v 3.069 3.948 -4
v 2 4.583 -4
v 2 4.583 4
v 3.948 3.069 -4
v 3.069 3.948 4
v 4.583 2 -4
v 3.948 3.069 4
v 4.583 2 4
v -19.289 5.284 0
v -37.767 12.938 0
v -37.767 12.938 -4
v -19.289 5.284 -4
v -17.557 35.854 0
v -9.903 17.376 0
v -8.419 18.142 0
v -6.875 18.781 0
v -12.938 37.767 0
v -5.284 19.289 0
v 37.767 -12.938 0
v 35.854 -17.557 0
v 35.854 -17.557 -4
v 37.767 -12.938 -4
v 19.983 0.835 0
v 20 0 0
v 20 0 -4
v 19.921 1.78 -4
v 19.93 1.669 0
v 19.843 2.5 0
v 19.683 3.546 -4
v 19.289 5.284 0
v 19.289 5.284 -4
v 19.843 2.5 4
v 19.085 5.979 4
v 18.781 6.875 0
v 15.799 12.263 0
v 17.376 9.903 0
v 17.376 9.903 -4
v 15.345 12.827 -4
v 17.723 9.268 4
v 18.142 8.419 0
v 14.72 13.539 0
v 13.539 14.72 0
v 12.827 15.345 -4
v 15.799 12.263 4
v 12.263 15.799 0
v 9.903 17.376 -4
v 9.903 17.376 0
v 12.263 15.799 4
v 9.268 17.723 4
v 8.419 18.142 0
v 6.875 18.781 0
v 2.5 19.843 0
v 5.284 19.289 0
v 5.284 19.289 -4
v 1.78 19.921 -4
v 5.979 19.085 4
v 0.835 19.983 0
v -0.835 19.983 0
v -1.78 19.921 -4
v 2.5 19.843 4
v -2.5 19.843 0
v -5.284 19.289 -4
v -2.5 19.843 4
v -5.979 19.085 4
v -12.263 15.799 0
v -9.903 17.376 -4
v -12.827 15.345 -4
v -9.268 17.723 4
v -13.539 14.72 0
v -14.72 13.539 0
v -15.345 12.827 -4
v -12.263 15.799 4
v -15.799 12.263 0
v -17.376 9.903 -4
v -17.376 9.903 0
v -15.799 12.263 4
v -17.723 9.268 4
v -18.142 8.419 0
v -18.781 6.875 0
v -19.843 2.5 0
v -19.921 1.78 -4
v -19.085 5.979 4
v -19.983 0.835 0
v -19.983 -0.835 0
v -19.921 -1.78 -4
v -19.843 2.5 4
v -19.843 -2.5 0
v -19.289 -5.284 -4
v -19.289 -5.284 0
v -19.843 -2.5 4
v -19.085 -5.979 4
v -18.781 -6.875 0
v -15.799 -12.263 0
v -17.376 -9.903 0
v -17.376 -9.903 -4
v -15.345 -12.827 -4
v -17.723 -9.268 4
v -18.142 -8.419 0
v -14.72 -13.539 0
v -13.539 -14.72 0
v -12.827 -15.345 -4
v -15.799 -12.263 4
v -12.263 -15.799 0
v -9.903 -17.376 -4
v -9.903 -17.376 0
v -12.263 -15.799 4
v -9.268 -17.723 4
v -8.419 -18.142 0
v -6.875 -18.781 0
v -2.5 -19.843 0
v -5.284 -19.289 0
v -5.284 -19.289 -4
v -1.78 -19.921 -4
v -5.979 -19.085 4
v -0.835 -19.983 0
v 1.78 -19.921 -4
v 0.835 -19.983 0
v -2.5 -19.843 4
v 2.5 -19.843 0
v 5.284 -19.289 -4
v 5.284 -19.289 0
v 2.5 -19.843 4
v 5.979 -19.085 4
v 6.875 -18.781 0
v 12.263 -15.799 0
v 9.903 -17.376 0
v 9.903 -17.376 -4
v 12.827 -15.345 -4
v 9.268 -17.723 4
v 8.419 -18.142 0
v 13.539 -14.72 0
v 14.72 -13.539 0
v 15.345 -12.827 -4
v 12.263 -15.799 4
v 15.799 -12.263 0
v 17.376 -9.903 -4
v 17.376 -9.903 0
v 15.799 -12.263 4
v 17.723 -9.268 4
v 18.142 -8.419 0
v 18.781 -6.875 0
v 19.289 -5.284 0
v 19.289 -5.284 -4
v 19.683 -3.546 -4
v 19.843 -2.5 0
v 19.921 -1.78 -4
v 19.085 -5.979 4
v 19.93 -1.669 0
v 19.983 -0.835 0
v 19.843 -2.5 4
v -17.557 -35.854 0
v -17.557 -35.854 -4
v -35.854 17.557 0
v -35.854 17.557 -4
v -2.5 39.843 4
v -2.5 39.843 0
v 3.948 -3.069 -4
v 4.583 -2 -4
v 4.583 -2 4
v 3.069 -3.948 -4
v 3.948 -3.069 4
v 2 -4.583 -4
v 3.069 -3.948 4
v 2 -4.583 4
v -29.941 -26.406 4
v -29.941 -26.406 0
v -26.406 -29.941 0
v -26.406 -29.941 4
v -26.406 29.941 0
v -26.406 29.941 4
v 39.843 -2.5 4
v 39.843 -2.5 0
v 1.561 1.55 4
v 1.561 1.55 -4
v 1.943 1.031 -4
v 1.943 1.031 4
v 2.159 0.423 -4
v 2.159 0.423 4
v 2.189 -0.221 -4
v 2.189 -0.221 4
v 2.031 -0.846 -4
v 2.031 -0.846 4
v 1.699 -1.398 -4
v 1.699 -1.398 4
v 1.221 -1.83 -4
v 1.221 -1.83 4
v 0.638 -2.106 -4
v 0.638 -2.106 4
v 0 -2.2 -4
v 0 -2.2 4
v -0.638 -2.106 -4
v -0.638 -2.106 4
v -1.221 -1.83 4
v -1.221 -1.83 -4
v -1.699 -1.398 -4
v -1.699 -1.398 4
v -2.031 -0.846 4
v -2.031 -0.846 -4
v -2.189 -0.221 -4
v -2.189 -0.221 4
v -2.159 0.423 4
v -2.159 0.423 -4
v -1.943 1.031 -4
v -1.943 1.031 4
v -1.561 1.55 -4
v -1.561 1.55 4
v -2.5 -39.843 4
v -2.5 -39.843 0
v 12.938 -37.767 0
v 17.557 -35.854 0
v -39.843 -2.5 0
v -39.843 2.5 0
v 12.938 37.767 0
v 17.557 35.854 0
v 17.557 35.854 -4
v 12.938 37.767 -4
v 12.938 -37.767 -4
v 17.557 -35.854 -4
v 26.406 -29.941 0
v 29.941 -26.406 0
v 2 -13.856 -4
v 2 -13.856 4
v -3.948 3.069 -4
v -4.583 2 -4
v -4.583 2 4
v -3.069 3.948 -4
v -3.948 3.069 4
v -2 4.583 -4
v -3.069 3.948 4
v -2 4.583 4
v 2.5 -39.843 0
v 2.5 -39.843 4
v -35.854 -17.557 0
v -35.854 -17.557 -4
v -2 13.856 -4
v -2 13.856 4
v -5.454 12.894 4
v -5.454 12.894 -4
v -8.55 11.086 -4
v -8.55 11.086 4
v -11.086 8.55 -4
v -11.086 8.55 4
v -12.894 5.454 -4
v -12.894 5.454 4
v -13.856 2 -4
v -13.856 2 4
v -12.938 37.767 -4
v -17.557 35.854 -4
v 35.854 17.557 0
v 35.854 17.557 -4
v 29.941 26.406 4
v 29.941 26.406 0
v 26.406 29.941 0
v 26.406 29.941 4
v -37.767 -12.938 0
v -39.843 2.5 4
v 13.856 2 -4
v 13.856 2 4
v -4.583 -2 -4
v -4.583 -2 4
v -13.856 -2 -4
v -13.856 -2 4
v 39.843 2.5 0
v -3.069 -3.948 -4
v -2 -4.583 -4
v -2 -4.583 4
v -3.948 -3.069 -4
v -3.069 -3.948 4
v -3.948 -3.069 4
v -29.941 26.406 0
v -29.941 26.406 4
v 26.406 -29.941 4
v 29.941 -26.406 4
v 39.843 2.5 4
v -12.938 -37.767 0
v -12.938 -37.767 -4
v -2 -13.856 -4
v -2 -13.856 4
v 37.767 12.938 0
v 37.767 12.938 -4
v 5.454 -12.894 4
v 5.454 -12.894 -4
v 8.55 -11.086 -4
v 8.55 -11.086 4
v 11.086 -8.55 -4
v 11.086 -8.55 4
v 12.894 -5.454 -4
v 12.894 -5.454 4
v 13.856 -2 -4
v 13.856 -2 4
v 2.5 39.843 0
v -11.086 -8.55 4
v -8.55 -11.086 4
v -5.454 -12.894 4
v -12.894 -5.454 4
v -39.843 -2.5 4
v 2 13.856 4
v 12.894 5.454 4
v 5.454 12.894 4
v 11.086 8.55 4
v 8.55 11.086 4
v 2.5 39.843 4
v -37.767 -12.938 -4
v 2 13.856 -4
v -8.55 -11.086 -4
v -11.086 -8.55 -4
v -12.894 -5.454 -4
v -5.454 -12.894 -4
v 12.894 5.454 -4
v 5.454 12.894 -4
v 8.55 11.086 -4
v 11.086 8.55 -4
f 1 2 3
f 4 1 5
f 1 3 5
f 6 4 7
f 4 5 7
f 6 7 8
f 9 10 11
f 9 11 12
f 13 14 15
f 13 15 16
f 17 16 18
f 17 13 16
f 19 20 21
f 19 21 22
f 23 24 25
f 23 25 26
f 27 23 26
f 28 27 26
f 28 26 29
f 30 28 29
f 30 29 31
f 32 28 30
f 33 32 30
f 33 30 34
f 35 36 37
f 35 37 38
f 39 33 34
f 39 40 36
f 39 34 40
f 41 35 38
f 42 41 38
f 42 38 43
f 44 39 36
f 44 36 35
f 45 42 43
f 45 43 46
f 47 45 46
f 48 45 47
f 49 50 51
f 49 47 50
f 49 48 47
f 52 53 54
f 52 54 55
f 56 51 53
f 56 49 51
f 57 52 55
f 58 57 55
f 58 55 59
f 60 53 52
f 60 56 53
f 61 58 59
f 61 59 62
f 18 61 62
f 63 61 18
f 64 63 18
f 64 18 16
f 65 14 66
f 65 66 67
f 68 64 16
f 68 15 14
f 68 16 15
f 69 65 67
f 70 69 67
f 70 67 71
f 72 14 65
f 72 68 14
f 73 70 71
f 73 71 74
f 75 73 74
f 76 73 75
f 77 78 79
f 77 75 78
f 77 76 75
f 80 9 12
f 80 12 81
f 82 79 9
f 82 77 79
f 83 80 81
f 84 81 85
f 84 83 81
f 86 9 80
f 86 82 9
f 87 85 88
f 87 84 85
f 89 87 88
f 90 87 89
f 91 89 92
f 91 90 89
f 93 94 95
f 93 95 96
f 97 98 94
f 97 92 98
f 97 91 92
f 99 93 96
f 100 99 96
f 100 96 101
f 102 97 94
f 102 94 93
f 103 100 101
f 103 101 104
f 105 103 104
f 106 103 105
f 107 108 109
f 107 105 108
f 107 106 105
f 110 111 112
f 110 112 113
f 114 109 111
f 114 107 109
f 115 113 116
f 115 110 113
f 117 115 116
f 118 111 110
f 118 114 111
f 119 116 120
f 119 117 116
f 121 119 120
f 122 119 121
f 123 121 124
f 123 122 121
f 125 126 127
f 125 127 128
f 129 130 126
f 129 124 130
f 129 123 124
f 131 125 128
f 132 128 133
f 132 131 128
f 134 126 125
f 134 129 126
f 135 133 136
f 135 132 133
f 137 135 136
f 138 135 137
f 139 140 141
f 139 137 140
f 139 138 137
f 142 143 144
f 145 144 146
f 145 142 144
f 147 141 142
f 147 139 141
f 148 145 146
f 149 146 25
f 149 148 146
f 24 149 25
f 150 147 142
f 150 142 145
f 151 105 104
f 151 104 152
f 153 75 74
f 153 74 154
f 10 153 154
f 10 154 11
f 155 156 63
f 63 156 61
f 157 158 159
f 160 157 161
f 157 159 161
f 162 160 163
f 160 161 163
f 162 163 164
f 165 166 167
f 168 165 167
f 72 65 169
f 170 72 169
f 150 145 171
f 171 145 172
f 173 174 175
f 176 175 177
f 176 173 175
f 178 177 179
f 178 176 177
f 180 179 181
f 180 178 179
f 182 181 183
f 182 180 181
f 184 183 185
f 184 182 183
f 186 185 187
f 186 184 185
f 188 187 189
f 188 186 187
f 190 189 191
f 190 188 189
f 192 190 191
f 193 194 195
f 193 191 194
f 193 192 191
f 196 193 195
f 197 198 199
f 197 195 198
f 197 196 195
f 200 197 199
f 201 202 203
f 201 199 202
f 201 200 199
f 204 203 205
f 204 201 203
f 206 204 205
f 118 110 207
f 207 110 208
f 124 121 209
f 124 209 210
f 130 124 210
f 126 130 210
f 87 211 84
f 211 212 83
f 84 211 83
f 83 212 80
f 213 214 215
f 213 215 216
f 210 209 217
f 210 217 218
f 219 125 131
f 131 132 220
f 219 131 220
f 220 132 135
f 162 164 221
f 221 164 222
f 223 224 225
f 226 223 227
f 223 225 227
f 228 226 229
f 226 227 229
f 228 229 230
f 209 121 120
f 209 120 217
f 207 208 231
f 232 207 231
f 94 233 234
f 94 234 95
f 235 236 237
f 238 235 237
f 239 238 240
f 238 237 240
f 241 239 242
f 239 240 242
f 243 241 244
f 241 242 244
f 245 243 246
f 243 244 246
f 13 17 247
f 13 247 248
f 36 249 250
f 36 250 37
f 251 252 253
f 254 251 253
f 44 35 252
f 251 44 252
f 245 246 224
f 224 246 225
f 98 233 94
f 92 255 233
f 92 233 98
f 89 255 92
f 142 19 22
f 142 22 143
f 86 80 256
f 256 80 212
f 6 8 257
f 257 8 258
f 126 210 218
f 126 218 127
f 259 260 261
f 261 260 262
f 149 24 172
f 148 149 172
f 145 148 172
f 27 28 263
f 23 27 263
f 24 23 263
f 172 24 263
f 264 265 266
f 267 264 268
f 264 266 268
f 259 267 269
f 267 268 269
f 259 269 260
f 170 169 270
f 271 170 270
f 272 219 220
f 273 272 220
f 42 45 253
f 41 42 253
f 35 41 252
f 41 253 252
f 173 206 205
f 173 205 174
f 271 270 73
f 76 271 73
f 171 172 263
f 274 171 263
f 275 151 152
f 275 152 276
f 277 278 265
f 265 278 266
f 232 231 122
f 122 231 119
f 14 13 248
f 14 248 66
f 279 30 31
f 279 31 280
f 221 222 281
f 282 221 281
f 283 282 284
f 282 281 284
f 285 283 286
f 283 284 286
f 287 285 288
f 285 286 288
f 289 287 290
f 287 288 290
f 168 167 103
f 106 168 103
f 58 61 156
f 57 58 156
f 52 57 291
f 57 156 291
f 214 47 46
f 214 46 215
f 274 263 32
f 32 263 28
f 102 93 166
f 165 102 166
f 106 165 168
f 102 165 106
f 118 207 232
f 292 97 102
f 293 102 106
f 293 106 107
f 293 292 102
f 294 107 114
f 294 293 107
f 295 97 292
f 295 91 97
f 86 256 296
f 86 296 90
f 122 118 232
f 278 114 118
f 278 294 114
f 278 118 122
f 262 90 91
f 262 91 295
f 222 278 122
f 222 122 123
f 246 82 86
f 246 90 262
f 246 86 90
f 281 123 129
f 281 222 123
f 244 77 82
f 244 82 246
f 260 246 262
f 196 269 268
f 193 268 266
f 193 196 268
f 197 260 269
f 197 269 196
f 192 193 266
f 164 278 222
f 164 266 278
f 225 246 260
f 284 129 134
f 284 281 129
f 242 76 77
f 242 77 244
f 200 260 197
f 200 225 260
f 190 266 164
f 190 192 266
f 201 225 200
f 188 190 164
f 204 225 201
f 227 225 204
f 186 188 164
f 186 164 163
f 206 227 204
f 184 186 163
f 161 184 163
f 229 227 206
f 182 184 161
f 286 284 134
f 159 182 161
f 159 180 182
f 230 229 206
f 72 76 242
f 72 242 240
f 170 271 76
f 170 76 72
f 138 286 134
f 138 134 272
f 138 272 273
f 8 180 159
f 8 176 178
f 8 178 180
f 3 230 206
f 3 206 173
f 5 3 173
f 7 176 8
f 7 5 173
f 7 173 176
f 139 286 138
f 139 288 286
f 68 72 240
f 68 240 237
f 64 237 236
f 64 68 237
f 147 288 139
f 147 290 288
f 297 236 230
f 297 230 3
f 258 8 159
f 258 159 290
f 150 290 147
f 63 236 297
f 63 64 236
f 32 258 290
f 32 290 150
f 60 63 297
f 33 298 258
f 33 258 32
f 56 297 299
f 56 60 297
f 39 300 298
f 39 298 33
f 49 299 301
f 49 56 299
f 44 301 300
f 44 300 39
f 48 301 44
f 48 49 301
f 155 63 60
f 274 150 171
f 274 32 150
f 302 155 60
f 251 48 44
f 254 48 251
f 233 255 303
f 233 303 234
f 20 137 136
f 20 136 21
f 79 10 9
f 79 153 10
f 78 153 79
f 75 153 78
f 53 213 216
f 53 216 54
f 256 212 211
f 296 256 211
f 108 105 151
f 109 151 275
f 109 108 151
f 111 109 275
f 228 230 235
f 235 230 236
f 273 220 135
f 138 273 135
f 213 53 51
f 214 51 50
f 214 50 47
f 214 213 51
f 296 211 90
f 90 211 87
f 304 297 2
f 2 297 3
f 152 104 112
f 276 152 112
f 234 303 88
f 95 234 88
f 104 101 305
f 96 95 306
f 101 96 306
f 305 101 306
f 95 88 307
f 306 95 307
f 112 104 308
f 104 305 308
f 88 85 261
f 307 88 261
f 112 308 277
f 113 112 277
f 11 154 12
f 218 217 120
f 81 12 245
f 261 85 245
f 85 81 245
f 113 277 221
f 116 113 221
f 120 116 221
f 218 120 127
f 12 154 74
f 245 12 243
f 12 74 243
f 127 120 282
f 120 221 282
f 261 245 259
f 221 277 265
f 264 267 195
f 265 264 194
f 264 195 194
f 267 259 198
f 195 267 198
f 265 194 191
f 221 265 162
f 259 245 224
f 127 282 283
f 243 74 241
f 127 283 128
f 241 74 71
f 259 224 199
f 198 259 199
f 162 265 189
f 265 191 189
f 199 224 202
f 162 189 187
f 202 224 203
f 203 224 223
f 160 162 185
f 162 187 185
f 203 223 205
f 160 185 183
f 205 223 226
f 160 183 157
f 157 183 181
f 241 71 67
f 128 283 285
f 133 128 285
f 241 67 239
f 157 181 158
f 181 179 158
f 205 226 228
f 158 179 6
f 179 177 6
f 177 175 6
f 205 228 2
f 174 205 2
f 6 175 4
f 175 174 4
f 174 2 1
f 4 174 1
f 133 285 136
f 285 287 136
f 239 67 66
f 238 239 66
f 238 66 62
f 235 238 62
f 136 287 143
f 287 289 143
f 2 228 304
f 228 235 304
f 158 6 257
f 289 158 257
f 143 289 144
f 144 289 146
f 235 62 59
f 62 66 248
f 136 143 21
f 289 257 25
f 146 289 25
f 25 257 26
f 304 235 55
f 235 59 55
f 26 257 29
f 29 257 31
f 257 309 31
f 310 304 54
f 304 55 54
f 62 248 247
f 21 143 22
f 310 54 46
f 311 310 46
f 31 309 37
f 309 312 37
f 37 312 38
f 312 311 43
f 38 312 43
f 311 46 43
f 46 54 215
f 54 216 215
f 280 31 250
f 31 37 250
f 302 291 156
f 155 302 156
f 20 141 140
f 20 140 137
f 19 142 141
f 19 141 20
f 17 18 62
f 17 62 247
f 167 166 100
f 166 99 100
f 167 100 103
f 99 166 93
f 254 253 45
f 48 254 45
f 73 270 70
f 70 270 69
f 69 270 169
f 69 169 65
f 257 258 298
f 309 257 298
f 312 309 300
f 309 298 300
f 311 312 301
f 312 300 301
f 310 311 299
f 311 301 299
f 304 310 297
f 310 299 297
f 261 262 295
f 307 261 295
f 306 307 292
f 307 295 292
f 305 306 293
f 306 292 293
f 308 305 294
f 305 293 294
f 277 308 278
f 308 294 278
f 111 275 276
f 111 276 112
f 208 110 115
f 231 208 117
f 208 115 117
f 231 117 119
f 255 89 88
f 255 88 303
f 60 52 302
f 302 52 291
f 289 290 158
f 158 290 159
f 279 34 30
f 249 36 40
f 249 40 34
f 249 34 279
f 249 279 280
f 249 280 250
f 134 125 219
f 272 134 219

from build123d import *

# Parameters (mm, degrees)
SKETCH_2_R               = 20
EXTRUDE_3_DEPTH          = 4
CUT_EXTRUDE_6_DEPTH      = 5
CUT_EXTRUDE_6_DEPTH_BACK = 5
CUT_EXTRUDE_7_DEPTH      = 5
CUT_EXTRUDE_7_DEPTH_BACK = 5
EXTRUDE_4_DEPTH          = 4
EXTRUDE_5_DEPTH          = 4


with BuildPart() as part:
    # Эскиз2 → Бобышка-Вытянуть3 (new body, symmetric)
    with BuildSketch(Plane.XY):
        Circle(SKETCH_2_R)
    extrude(amount=EXTRUDE_3_DEPTH, both=True)

    # Эскиз2<10> → Вырез-Вытянуть6 (cut, two sides)
    with BuildSketch(Plane.XY) as cut_extrude_6_sk:
        with BuildLine():
            Line((-1.5612495, 1.55), (1.5612495, 1.55))
            ThreePointArc((1.5612495, 1.55), (0, -2.2), (-1.5612495, 1.55))
        make_face()
    extrude(amount=CUT_EXTRUDE_6_DEPTH, mode=Mode.SUBTRACT)
    extrude(cut_extrude_6_sk.sketch, amount=-CUT_EXTRUDE_6_DEPTH_BACK, mode=Mode.SUBTRACT)

    # Эскиз2<11> → Вырез-Вытянуть7 (cut, two sides)
    with BuildSketch(Plane.XY) as cut_extrude_7_sk:
        with BuildLine():
            ThreePointArc((13.856406461, 2), (9.899494937, 9.899494937), (2, 13.856406461))
            Line((2, 13.856406461), (2, 4.582575695))
            ThreePointArc((2, 4.582575695), (3.535533906, 3.535533906), (4.582575695, 2))
            Line((4.582575695, 2), (13.856406461, 2))
        make_face()
        with BuildLine():
            ThreePointArc((-2, 13.856406461), (-9.899494937, 9.899494937), (-13.856406461, 2))
            Line((-13.856406461, 2), (-4.582575695, 2))
            ThreePointArc((-4.582575695, 2), (-3.535533906, 3.535533906), (-2, 4.582575695))
            Line((-2, 4.582575695), (-2, 13.856406461))
        make_face()
        with BuildLine():
            Line((-4.582575695, -2), (-13.856406461, -2))
            ThreePointArc((-13.856406461, -2), (-9.899494937, -9.899494937), (-2, -13.856406461))
            Line((-2, -13.856406461), (-2, -4.582575695))
            ThreePointArc((-2, -4.582575695), (-3.535533906, -3.535533906), (-4.582575695, -2))
        make_face()
        with BuildLine():
            Line((2, -4.582575695), (2, -13.856406461))
            ThreePointArc((2, -13.856406461), (9.899494937, -9.899494937), (13.856406461, -2))
            Line((13.856406461, -2), (4.582575695, -2))
            ThreePointArc((4.582575695, -2), (3.535533906, -3.535533906), (2, -4.582575695))
        make_face()
    extrude(amount=CUT_EXTRUDE_7_DEPTH, mode=Mode.SUBTRACT)
    extrude(cut_extrude_7_sk.sketch, amount=-CUT_EXTRUDE_7_DEPTH_BACK, mode=Mode.SUBTRACT)

    # Эскиз2<12> → Бобышка-Вытянуть4 (add)
    with BuildSketch(Plane.XY):
        with BuildLine():
            ThreePointArc((20, 0), (19.960745185, -1.252458251), (19.843134833, -2.5))
            Line((19.843134833, -2.5), (39.843134833, -2.5))
            Line((39.843134833, -2.5), (39.843134833, 2.5))
            Line((39.843134833, 2.5), (19.843134833, 2.5))
            ThreePointArc((19.843134833, 2.5), (19.960745185, 1.252458251), (20, 0))
        make_face()
        with BuildLine():
            Line((26.405583871, 29.941117777), (12.263448247, 15.798982153))
            ThreePointArc((12.263448247, 15.798982153), (14.142135624, 14.142135624), (15.798982153, 12.263448247))
            Line((15.798982153, 12.263448247), (29.941117777, 26.405583871))
            Line((29.941117777, 26.405583871), (26.405583871, 29.941117777))
        make_face()
        with BuildLine():
            Line((-2.5, 39.843134833), (-2.5, 19.843134833))
            ThreePointArc((-2.5, 19.843134833), (0, 20), (2.5, 19.843134833))
            Line((2.5, 19.843134833), (2.5, 39.843134833))
            Line((2.5, 39.843134833), (-2.5, 39.843134833))
        make_face()
        with BuildLine():
            Line((-29.941117777, 26.405583871), (-15.798982153, 12.263448247))
            ThreePointArc((-15.798982153, 12.263448247), (-14.142135624, 14.142135624), (-12.263448247, 15.798982153))
            Line((-12.263448247, 15.798982153), (-26.405583871, 29.941117777))
            Line((-26.405583871, 29.941117777), (-29.941117777, 26.405583871))
        make_face()
        with BuildLine():
            Line((-39.843134833, -2.5), (-19.843134833, -2.5))
            ThreePointArc((-19.843134833, -2.5), (-20, 0), (-19.843134833, 2.5))
            Line((-19.843134833, 2.5), (-39.843134833, 2.5))
            Line((-39.843134833, 2.5), (-39.843134833, -2.5))
        make_face()
        with BuildLine():
            ThreePointArc((-12.263448247, -15.798982153), (-14.142135624, -14.142135624), (-15.798982153, -12.263448247))
            Line((-15.798982153, -12.263448247), (-29.941117777, -26.405583871))
            Line((-29.941117777, -26.405583871), (-26.405583871, -29.941117777))
            Line((-26.405583871, -29.941117777), (-12.263448247, -15.798982153))
        make_face()
        with BuildLine():
            ThreePointArc((2.5, -19.843134833), (0, -20), (-2.5, -19.843134833))
            Line((-2.5, -19.843134833), (-2.5, -39.843134833))
            Line((-2.5, -39.843134833), (2.5, -39.843134833))
            Line((2.5, -39.843134833), (2.5, -19.843134833))
        make_face()
        with BuildLine():
            ThreePointArc((15.798982153, -12.263448247), (14.142135624, -14.142135624), (12.263448247, -15.798982153))
            Line((12.263448247, -15.798982153), (26.405583871, -29.941117777))
            Line((26.405583871, -29.941117777), (29.941117777, -26.405583871))
            Line((29.941117777, -26.405583871), (15.798982153, -12.263448247))
        make_face()
    extrude(amount=EXTRUDE_4_DEPTH)

    # Эскиз2<13> → Бобышка-Вытянуть5 (add)
    with BuildSketch(Plane.XY):
        with BuildLine():
            Line((-17.557006425, 35.853548202), (-9.903337778, 17.375957552))
            ThreePointArc((-9.903337778, 17.375957552), (-7.653668647, 18.47759065), (-5.283940115, 19.289374714))
            Line((-5.283940115, 19.289374714), (-12.937608763, 37.766965364))
            Line((-12.937608763, 37.766965364), (-17.557006425, 35.853548202))
        make_face()
        with BuildLine():
            Line((-37.766965364, 12.937608763), (-19.289374714, 5.283940115))
            ThreePointArc((-19.289374714, 5.283940115), (-18.47759065, 7.653668647), (-17.375957552, 9.903337778))
            Line((-17.375957552, 9.903337778), (-35.853548202, 17.557006425))
            Line((-35.853548202, 17.557006425), (-37.766965364, 12.937608763))
        make_face()
        with BuildLine():
            ThreePointArc((-17.375957552, -9.903337778), (-18.47759065, -7.653668647), (-19.289374714, -5.283940115))
            Line((-19.289374714, -5.283940115), (-37.766965364, -12.937608763))
            Line((-37.766965364, -12.937608763), (-35.853548202, -17.557006425))
            Line((-35.853548202, -17.557006425), (-17.375957552, -9.903337778))
        make_face()
        with BuildLine():
            ThreePointArc((-5.283940115, -19.289374714), (-7.653668647, -18.47759065), (-9.903337778, -17.375957552))
            Line((-9.903337778, -17.375957552), (-17.557006425, -35.853548202))
            Line((-17.557006425, -35.853548202), (-12.937608763, -37.766965364))
            Line((-12.937608763, -37.766965364), (-5.283940115, -19.289374714))
        make_face()
        with BuildLine():
            ThreePointArc((9.903337778, -17.375957552), (7.653668647, -18.47759065), (5.283940115, -19.289374714))
            Line((5.283940115, -19.289374714), (12.937608763, -37.766965364))
            Line((12.937608763, -37.766965364), (17.557006425, -35.853548202))
            Line((17.557006425, -35.853548202), (9.903337778, -17.375957552))
        make_face()
        with BuildLine():
            ThreePointArc((19.289374714, -5.283940115), (18.47759065, -7.653668647), (17.375957552, -9.903337778))
            Line((17.375957552, -9.903337778), (35.853548202, -17.557006425))
            Line((35.853548202, -17.557006425), (37.766965364, -12.937608763))
            Line((37.766965364, -12.937608763), (19.289374714, -5.283940115))
        make_face()
        with BuildLine():
            Line((35.853548202, 17.557006425), (17.375957552, 9.903337778))
            ThreePointArc((17.375957552, 9.903337778), (18.47759065, 7.653668647), (19.289374714, 5.283940115))
            Line((19.289374714, 5.283940115), (37.766965364, 12.937608763))
            Line((37.766965364, 12.937608763), (35.853548202, 17.557006425))
        make_face()
        with BuildLine():
            Line((12.937608763, 37.766965364), (5.283940115, 19.289374714))
            ThreePointArc((5.283940115, 19.289374714), (7.653668647, 18.47759065), (9.903337778, 17.375957552))
            Line((9.903337778, 17.375957552), (17.557006425, 35.853548202))
            Line((17.557006425, 35.853548202), (12.937608763, 37.766965364))
        make_face()
    extrude(amount=-EXTRUDE_5_DEPTH)


solid = part.part
